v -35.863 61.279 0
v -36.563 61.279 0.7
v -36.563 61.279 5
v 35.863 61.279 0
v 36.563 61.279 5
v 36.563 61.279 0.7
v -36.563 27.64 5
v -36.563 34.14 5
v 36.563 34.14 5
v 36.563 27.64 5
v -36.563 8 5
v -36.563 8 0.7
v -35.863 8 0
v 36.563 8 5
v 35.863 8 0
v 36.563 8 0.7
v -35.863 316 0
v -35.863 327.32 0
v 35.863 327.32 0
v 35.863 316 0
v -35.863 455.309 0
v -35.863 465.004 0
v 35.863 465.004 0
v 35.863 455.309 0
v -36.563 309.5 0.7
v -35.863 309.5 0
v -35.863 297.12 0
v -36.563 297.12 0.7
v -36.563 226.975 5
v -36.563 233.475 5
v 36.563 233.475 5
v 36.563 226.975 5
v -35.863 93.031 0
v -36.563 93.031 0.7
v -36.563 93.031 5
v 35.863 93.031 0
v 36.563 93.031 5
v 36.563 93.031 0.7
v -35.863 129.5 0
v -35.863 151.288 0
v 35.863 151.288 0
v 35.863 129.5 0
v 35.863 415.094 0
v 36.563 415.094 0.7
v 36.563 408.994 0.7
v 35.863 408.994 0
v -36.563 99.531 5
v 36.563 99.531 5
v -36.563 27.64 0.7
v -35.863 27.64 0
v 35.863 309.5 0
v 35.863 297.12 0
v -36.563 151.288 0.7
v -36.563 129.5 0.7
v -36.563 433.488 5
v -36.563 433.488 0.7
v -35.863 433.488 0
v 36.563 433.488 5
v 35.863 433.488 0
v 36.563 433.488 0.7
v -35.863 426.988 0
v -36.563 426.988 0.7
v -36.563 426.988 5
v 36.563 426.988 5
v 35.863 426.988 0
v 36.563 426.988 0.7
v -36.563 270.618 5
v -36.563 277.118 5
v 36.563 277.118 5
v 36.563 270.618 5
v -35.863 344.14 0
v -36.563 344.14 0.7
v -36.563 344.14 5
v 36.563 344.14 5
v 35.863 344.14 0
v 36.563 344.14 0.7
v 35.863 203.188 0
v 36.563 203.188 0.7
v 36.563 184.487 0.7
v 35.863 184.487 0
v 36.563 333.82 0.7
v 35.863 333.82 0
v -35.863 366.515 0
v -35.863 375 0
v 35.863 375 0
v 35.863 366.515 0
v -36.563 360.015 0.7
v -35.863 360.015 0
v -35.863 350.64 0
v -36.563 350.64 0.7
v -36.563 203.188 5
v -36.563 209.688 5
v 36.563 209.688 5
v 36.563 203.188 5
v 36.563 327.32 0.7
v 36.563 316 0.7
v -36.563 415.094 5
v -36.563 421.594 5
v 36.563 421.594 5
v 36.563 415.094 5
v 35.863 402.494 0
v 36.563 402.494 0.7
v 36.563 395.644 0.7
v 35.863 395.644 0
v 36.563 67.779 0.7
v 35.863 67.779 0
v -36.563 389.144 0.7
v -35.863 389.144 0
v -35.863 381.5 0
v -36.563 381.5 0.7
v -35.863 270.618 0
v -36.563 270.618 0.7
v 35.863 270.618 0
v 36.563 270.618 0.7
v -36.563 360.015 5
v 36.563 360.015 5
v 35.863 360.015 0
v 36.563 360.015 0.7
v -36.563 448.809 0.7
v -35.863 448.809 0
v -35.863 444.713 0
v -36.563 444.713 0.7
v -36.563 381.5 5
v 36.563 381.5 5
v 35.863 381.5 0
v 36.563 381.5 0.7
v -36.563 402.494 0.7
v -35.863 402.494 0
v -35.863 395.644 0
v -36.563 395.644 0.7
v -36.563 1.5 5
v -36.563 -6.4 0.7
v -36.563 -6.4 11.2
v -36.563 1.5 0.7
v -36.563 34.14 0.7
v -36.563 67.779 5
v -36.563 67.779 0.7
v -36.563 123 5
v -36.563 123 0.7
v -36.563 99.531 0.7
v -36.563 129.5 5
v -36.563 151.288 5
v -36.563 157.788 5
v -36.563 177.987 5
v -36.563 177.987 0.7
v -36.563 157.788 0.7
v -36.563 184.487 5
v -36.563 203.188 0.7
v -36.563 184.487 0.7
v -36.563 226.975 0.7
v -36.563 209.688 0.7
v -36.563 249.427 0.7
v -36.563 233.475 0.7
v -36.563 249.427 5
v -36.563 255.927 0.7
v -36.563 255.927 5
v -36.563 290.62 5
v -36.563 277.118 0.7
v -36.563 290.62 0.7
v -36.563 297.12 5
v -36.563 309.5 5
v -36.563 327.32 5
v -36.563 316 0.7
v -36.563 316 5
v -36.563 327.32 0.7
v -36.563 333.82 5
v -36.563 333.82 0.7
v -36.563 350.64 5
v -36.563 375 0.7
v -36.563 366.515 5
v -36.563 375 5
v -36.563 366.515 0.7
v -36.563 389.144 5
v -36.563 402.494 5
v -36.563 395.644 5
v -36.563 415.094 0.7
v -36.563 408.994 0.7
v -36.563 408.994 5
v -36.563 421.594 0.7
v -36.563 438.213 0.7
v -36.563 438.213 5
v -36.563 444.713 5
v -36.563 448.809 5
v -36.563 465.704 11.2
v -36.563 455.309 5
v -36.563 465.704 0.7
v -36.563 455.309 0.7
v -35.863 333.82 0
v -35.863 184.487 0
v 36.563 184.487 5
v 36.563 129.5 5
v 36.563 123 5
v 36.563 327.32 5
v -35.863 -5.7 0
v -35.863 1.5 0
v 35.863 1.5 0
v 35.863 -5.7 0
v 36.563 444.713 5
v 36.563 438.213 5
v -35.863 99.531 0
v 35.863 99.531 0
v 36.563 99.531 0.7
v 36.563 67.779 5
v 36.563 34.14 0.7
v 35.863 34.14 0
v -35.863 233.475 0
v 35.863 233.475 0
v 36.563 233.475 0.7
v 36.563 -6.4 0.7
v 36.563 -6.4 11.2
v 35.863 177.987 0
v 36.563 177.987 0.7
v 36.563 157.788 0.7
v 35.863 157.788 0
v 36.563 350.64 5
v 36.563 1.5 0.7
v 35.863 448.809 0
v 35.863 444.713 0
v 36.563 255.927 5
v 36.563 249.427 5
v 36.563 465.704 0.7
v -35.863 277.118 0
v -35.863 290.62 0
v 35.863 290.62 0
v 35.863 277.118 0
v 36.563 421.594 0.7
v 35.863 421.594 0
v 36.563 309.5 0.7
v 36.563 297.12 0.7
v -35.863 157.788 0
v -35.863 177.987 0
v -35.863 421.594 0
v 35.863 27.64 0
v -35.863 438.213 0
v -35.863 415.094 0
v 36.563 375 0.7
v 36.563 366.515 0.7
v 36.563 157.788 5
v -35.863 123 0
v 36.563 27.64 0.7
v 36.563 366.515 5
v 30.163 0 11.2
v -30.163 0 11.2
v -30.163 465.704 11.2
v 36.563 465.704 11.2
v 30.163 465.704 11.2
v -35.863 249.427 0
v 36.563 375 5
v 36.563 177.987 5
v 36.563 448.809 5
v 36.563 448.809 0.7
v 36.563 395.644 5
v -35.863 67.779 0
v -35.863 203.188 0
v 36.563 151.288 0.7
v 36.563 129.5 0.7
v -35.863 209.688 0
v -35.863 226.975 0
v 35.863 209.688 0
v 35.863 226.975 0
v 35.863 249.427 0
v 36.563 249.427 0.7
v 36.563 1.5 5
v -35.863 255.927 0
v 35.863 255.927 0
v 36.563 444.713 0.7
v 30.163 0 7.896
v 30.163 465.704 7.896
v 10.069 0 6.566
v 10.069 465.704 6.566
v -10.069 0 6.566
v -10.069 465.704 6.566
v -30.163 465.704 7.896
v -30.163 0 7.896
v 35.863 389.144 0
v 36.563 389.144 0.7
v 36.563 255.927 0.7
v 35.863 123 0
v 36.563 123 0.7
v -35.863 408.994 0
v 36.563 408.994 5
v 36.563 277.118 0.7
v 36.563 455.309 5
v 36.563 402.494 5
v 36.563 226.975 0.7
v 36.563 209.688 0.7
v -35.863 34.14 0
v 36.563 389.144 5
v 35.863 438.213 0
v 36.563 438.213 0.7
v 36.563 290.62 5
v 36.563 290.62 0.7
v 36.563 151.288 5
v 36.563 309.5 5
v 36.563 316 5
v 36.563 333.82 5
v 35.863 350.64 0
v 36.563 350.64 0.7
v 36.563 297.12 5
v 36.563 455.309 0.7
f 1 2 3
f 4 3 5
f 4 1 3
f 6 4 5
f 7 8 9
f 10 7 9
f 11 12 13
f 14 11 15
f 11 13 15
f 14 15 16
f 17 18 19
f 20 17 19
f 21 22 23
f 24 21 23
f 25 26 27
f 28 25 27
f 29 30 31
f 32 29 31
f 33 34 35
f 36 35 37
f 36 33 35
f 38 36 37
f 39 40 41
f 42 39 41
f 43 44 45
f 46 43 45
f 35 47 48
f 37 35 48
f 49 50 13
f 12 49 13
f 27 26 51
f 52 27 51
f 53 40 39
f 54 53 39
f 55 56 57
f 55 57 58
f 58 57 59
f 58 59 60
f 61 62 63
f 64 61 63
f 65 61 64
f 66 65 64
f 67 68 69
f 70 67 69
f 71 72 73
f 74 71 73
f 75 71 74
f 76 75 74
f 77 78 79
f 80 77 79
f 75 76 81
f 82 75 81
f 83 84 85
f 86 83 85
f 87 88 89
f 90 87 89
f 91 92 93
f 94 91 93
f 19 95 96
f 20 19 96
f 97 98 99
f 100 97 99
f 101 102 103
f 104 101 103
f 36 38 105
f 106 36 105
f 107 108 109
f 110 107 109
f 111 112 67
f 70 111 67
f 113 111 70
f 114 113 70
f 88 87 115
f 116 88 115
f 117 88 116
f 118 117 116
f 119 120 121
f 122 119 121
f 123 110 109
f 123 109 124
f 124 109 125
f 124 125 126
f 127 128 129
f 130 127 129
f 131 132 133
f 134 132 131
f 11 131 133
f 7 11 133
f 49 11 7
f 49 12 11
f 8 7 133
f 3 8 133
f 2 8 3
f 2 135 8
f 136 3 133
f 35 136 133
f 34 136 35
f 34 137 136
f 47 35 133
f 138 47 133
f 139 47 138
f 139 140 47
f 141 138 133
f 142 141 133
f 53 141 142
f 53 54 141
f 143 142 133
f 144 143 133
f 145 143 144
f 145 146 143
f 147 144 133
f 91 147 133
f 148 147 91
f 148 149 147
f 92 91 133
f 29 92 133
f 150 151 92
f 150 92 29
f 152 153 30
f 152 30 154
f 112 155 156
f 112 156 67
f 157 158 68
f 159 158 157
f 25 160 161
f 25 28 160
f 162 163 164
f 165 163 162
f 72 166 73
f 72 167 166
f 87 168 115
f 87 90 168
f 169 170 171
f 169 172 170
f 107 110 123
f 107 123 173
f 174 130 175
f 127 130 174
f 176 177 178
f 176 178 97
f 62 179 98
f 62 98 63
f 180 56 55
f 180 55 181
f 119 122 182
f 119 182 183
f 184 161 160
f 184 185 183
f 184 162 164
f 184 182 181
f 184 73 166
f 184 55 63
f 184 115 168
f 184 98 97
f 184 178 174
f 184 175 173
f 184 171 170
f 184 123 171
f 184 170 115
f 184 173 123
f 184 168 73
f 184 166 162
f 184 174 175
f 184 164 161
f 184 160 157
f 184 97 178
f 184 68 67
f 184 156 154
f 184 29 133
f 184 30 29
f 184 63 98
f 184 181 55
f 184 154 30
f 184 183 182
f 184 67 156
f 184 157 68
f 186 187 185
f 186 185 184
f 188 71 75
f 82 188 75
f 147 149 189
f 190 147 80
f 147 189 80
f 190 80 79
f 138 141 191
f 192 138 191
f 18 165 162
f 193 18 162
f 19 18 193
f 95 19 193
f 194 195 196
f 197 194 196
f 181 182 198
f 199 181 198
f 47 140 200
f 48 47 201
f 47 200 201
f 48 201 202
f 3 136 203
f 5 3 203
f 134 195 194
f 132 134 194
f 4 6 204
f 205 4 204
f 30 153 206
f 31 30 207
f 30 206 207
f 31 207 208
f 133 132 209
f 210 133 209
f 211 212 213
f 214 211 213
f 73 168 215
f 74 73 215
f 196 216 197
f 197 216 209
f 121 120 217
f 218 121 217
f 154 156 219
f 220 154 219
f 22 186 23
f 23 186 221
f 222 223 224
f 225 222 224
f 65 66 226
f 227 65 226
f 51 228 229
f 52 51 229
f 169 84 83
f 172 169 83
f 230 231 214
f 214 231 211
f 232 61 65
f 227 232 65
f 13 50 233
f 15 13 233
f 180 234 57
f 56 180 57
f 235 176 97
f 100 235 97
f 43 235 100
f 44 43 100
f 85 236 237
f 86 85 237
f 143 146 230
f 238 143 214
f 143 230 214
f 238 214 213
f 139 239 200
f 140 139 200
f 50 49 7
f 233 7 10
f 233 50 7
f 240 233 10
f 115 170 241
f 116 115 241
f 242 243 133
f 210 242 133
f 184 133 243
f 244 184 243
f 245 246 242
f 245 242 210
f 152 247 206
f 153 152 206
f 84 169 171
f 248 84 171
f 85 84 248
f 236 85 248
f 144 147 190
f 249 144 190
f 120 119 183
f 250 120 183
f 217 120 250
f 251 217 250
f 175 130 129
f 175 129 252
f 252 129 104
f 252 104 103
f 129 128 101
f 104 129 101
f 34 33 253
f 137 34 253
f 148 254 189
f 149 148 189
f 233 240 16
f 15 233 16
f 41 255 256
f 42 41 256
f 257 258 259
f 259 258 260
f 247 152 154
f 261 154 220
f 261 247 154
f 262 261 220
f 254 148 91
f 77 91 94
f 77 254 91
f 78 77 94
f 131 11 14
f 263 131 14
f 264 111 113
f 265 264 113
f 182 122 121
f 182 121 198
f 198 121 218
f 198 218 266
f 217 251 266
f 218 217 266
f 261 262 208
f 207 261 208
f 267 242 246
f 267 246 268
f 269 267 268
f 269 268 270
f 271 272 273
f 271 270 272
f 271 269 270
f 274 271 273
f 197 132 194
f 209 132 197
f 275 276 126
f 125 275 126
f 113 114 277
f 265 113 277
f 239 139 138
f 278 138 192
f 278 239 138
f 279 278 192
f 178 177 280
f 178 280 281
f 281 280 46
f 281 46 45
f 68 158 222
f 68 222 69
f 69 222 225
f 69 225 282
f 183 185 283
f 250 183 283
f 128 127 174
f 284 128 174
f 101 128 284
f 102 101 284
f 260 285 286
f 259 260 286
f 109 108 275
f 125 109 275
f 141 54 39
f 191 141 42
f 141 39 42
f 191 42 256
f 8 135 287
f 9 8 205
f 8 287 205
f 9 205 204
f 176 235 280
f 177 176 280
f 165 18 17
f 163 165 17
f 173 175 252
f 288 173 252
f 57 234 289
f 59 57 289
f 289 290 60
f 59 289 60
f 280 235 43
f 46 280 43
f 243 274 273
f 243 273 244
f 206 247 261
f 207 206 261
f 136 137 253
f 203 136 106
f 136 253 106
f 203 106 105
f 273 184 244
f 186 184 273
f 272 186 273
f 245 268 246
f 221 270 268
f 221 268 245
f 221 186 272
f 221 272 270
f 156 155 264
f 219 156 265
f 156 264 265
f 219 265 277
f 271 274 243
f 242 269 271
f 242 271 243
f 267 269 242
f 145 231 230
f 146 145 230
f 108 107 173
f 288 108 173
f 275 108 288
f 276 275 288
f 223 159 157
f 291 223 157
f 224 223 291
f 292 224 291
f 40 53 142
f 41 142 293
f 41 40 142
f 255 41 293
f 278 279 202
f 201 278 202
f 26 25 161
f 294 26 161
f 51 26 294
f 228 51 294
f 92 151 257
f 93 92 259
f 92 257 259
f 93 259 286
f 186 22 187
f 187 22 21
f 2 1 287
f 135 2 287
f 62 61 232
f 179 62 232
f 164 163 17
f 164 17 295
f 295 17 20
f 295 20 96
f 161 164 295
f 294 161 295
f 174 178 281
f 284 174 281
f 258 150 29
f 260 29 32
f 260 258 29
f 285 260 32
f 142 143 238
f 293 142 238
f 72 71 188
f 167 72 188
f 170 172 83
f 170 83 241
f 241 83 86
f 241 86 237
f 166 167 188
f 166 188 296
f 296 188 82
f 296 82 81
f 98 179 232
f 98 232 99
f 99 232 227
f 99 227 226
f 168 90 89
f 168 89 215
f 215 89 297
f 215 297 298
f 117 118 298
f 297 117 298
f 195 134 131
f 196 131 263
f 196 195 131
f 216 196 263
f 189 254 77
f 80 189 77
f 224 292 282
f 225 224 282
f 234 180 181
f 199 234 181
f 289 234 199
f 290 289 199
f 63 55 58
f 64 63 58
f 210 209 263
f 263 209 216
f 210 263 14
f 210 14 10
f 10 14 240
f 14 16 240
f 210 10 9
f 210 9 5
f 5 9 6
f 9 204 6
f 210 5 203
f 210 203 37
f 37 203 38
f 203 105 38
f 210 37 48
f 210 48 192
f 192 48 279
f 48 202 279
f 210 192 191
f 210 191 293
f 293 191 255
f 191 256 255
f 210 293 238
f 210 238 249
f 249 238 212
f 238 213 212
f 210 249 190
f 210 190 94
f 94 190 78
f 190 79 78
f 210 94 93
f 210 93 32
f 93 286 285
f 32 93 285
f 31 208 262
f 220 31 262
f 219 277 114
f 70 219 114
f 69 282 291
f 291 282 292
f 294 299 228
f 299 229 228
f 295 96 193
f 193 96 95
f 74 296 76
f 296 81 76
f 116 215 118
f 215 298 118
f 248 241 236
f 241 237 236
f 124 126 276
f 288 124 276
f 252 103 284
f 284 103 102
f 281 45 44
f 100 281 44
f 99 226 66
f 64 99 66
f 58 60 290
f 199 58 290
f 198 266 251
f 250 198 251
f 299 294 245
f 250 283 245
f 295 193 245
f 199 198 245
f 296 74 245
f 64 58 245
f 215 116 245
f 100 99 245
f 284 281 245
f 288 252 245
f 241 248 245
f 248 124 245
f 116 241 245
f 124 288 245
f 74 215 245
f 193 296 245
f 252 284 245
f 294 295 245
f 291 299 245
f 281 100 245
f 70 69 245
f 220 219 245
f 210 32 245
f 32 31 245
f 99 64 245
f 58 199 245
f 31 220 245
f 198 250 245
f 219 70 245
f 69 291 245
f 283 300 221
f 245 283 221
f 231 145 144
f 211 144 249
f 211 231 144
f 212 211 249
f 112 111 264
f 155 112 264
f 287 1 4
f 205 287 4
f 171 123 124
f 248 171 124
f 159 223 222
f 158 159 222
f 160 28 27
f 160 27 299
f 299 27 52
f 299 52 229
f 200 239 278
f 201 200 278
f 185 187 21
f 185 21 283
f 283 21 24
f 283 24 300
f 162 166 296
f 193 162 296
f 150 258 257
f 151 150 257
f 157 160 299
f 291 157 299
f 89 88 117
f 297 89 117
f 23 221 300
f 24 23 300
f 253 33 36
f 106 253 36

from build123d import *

# Parameters (mm, degrees)
SKETCH2_W               = 73.126
SKETCH2_H               = 465.703533893
BOSS_EXTRUDE1_DEPTH     = 12.8
CUT_EXTRUDE3_DEPTH      = 468.311966945
CUT_EXTRUDE3_DEPTH_BACK = 468.311966945
SKETCH4_W               = 73.126
SKETCH4_H               = 6.4
BOSS_EXTRUDE3_DEPTH     = 12.8
CHAMFER5_SIZE           = 0.7
SKETCH1_W               = 80.142296905
SKETCH1_H               = 6.5
CUT_EXTRUDE4_DEPTH      = 5
SKETCH7_W               = 73.126
SKETCH7_H               = 472.103533893
CUT_EXTRUDE7_DEPTH      = 1.6


with BuildPart() as part:
    # Sketch2 → Boss-Extrude1 (new body)
    with BuildSketch(Plane.XY):
        with Locations((0, 232.851766947)):
            Rectangle(SKETCH2_W, SKETCH2_H)
    extrude(amount=BOSS_EXTRUDE1_DEPTH)

    # Sketch3 → Cut-Extrude3 (cut, two sides: drawn at the far end of the back side and taken through both)
    with BuildSketch(Plane(origin=(0, 0, 0), x_dir=(1, 0, 0), z_dir=(0, 1, 0)).offset(-CUT_EXTRUDE3_DEPTH_BACK)):
        with BuildLine():
            Line((30.163, -158.685232104), (30.163, -12.8))
            Line((30.163, -12.8), (30.163, -7.896136802))
            ThreePointArc((30.163, -7.896136802), (0, -6.4), (-30.163, -7.896136802))
            Line((-30.163, -7.896136802), (-30.163, -12.8))
            Line((-30.163, -12.8), (-30.163, -158.685232104))
            Line((-30.163, -158.685232104), (-30.163, -450.455696312))
            Line((-30.163, -450.455696312), (30.163, -450.455696312))
            Line((30.163, -450.455696312), (30.163, -158.685232104))
        make_face()
    extrude(amount=CUT_EXTRUDE3_DEPTH + CUT_EXTRUDE3_DEPTH_BACK, mode=Mode.SUBTRACT)

    # Sketch4 → Boss-Extrude3 (add)
    with BuildSketch(Plane.XY):
        with Locations((0, -3.2)):
            Rectangle(SKETCH4_W, SKETCH4_H)
    extrude(amount=BOSS_EXTRUDE3_DEPTH)

    # Chamfer5
    chamfer5_edges = [part.edges().sort_by_distance(p)[0] for p in [
        (0, -6.4, 0),
        (0, 465.703533893, 0),
        (36.563, 229.651766947, 0),
        (-36.563, 229.651766947, 0),
    ]]
    chamfer(chamfer5_edges, length=CHAMFER5_SIZE)

    # Sketch1 → Cut-Extrude4 (cut)
    with BuildSketch(Plane.XY):
        with Locations((0.607494054, 452.05915)):
            Rectangle(SKETCH1_W, SKETCH1_H)
        with Locations((0.607494054, 441.46337)):
            Rectangle(SKETCH1_W, SKETCH1_H)
        with Locations((0.607494054, 64.52931)):
            Rectangle(SKETCH1_W, SKETCH1_H)
        with Locations((0.607494054, 96.28078)):
            Rectangle(SKETCH1_W, SKETCH1_H)
        with Locations((0.607494054, 363.26539)):
            Rectangle(SKETCH1_W, SKETCH1_H)
        with Locations((0.607494054, 154.5375)):
            Rectangle(SKETCH1_W, SKETCH1_H)
        with Locations((0.607494054, 206.43835)):
            Rectangle(SKETCH1_W, SKETCH1_H)
        with Locations((0.607494054, 252.67674)):
            Rectangle(SKETCH1_W, SKETCH1_H)
        with Locations((0.607494054, 293.87047)):
            Rectangle(SKETCH1_W, SKETCH1_H)
        with Locations((0.607494054, 330.56991)):
            Rectangle(SKETCH1_W, SKETCH1_H)
        with Locations((0.607494054, 378.25008)):
            Rectangle(SKETCH1_W, SKETCH1_H)
        with Locations((0.607494054, 405.7436)):
            Rectangle(SKETCH1_W, SKETCH1_H)
        with Locations((0.607494054, 30.88981)):
            Rectangle(SKETCH1_W, SKETCH1_H)
        with Locations((0.607494054, 430.23753)):
            Rectangle(SKETCH1_W, SKETCH1_H)
        with Locations((0.607494054, 418.34417)):
            Rectangle(SKETCH1_W, SKETCH1_H)
        with Locations((0.607494054, 392.39375)):
            Rectangle(SKETCH1_W, SKETCH1_H)
        with Locations((0.607494054, 126.25017)):
            Rectangle(SKETCH1_W, SKETCH1_H)
        with Locations((0.607494054, 347.38966)):
            Rectangle(SKETCH1_W, SKETCH1_H)
        with Locations((0.607494054, 181.23719)):
            Rectangle(SKETCH1_W, SKETCH1_H)
        with Locations((0.607494054, 312.75)):
            Rectangle(SKETCH1_W, SKETCH1_H)
        with Locations((0.607494054, 230.22507)):
            Rectangle(SKETCH1_W, SKETCH1_H)
        with Locations((0.607494054, 273.8683)):
            Rectangle(SKETCH1_W, SKETCH1_H)
        with Locations((0.607494054, 4.75)):
            Rectangle(SKETCH1_W, SKETCH1_H)
    extrude(amount=CUT_EXTRUDE4_DEPTH, mode=Mode.SUBTRACT)

    # Sketch7 → Cut-Extrude7 (cut)
    with BuildSketch(Plane.XY.offset(12.8)):
        with Locations((0, 229.651766947)):
            Rectangle(SKETCH7_W, SKETCH7_H)
    extrude(amount=-CUT_EXTRUDE7_DEPTH, mode=Mode.SUBTRACT)


solid = part.part
